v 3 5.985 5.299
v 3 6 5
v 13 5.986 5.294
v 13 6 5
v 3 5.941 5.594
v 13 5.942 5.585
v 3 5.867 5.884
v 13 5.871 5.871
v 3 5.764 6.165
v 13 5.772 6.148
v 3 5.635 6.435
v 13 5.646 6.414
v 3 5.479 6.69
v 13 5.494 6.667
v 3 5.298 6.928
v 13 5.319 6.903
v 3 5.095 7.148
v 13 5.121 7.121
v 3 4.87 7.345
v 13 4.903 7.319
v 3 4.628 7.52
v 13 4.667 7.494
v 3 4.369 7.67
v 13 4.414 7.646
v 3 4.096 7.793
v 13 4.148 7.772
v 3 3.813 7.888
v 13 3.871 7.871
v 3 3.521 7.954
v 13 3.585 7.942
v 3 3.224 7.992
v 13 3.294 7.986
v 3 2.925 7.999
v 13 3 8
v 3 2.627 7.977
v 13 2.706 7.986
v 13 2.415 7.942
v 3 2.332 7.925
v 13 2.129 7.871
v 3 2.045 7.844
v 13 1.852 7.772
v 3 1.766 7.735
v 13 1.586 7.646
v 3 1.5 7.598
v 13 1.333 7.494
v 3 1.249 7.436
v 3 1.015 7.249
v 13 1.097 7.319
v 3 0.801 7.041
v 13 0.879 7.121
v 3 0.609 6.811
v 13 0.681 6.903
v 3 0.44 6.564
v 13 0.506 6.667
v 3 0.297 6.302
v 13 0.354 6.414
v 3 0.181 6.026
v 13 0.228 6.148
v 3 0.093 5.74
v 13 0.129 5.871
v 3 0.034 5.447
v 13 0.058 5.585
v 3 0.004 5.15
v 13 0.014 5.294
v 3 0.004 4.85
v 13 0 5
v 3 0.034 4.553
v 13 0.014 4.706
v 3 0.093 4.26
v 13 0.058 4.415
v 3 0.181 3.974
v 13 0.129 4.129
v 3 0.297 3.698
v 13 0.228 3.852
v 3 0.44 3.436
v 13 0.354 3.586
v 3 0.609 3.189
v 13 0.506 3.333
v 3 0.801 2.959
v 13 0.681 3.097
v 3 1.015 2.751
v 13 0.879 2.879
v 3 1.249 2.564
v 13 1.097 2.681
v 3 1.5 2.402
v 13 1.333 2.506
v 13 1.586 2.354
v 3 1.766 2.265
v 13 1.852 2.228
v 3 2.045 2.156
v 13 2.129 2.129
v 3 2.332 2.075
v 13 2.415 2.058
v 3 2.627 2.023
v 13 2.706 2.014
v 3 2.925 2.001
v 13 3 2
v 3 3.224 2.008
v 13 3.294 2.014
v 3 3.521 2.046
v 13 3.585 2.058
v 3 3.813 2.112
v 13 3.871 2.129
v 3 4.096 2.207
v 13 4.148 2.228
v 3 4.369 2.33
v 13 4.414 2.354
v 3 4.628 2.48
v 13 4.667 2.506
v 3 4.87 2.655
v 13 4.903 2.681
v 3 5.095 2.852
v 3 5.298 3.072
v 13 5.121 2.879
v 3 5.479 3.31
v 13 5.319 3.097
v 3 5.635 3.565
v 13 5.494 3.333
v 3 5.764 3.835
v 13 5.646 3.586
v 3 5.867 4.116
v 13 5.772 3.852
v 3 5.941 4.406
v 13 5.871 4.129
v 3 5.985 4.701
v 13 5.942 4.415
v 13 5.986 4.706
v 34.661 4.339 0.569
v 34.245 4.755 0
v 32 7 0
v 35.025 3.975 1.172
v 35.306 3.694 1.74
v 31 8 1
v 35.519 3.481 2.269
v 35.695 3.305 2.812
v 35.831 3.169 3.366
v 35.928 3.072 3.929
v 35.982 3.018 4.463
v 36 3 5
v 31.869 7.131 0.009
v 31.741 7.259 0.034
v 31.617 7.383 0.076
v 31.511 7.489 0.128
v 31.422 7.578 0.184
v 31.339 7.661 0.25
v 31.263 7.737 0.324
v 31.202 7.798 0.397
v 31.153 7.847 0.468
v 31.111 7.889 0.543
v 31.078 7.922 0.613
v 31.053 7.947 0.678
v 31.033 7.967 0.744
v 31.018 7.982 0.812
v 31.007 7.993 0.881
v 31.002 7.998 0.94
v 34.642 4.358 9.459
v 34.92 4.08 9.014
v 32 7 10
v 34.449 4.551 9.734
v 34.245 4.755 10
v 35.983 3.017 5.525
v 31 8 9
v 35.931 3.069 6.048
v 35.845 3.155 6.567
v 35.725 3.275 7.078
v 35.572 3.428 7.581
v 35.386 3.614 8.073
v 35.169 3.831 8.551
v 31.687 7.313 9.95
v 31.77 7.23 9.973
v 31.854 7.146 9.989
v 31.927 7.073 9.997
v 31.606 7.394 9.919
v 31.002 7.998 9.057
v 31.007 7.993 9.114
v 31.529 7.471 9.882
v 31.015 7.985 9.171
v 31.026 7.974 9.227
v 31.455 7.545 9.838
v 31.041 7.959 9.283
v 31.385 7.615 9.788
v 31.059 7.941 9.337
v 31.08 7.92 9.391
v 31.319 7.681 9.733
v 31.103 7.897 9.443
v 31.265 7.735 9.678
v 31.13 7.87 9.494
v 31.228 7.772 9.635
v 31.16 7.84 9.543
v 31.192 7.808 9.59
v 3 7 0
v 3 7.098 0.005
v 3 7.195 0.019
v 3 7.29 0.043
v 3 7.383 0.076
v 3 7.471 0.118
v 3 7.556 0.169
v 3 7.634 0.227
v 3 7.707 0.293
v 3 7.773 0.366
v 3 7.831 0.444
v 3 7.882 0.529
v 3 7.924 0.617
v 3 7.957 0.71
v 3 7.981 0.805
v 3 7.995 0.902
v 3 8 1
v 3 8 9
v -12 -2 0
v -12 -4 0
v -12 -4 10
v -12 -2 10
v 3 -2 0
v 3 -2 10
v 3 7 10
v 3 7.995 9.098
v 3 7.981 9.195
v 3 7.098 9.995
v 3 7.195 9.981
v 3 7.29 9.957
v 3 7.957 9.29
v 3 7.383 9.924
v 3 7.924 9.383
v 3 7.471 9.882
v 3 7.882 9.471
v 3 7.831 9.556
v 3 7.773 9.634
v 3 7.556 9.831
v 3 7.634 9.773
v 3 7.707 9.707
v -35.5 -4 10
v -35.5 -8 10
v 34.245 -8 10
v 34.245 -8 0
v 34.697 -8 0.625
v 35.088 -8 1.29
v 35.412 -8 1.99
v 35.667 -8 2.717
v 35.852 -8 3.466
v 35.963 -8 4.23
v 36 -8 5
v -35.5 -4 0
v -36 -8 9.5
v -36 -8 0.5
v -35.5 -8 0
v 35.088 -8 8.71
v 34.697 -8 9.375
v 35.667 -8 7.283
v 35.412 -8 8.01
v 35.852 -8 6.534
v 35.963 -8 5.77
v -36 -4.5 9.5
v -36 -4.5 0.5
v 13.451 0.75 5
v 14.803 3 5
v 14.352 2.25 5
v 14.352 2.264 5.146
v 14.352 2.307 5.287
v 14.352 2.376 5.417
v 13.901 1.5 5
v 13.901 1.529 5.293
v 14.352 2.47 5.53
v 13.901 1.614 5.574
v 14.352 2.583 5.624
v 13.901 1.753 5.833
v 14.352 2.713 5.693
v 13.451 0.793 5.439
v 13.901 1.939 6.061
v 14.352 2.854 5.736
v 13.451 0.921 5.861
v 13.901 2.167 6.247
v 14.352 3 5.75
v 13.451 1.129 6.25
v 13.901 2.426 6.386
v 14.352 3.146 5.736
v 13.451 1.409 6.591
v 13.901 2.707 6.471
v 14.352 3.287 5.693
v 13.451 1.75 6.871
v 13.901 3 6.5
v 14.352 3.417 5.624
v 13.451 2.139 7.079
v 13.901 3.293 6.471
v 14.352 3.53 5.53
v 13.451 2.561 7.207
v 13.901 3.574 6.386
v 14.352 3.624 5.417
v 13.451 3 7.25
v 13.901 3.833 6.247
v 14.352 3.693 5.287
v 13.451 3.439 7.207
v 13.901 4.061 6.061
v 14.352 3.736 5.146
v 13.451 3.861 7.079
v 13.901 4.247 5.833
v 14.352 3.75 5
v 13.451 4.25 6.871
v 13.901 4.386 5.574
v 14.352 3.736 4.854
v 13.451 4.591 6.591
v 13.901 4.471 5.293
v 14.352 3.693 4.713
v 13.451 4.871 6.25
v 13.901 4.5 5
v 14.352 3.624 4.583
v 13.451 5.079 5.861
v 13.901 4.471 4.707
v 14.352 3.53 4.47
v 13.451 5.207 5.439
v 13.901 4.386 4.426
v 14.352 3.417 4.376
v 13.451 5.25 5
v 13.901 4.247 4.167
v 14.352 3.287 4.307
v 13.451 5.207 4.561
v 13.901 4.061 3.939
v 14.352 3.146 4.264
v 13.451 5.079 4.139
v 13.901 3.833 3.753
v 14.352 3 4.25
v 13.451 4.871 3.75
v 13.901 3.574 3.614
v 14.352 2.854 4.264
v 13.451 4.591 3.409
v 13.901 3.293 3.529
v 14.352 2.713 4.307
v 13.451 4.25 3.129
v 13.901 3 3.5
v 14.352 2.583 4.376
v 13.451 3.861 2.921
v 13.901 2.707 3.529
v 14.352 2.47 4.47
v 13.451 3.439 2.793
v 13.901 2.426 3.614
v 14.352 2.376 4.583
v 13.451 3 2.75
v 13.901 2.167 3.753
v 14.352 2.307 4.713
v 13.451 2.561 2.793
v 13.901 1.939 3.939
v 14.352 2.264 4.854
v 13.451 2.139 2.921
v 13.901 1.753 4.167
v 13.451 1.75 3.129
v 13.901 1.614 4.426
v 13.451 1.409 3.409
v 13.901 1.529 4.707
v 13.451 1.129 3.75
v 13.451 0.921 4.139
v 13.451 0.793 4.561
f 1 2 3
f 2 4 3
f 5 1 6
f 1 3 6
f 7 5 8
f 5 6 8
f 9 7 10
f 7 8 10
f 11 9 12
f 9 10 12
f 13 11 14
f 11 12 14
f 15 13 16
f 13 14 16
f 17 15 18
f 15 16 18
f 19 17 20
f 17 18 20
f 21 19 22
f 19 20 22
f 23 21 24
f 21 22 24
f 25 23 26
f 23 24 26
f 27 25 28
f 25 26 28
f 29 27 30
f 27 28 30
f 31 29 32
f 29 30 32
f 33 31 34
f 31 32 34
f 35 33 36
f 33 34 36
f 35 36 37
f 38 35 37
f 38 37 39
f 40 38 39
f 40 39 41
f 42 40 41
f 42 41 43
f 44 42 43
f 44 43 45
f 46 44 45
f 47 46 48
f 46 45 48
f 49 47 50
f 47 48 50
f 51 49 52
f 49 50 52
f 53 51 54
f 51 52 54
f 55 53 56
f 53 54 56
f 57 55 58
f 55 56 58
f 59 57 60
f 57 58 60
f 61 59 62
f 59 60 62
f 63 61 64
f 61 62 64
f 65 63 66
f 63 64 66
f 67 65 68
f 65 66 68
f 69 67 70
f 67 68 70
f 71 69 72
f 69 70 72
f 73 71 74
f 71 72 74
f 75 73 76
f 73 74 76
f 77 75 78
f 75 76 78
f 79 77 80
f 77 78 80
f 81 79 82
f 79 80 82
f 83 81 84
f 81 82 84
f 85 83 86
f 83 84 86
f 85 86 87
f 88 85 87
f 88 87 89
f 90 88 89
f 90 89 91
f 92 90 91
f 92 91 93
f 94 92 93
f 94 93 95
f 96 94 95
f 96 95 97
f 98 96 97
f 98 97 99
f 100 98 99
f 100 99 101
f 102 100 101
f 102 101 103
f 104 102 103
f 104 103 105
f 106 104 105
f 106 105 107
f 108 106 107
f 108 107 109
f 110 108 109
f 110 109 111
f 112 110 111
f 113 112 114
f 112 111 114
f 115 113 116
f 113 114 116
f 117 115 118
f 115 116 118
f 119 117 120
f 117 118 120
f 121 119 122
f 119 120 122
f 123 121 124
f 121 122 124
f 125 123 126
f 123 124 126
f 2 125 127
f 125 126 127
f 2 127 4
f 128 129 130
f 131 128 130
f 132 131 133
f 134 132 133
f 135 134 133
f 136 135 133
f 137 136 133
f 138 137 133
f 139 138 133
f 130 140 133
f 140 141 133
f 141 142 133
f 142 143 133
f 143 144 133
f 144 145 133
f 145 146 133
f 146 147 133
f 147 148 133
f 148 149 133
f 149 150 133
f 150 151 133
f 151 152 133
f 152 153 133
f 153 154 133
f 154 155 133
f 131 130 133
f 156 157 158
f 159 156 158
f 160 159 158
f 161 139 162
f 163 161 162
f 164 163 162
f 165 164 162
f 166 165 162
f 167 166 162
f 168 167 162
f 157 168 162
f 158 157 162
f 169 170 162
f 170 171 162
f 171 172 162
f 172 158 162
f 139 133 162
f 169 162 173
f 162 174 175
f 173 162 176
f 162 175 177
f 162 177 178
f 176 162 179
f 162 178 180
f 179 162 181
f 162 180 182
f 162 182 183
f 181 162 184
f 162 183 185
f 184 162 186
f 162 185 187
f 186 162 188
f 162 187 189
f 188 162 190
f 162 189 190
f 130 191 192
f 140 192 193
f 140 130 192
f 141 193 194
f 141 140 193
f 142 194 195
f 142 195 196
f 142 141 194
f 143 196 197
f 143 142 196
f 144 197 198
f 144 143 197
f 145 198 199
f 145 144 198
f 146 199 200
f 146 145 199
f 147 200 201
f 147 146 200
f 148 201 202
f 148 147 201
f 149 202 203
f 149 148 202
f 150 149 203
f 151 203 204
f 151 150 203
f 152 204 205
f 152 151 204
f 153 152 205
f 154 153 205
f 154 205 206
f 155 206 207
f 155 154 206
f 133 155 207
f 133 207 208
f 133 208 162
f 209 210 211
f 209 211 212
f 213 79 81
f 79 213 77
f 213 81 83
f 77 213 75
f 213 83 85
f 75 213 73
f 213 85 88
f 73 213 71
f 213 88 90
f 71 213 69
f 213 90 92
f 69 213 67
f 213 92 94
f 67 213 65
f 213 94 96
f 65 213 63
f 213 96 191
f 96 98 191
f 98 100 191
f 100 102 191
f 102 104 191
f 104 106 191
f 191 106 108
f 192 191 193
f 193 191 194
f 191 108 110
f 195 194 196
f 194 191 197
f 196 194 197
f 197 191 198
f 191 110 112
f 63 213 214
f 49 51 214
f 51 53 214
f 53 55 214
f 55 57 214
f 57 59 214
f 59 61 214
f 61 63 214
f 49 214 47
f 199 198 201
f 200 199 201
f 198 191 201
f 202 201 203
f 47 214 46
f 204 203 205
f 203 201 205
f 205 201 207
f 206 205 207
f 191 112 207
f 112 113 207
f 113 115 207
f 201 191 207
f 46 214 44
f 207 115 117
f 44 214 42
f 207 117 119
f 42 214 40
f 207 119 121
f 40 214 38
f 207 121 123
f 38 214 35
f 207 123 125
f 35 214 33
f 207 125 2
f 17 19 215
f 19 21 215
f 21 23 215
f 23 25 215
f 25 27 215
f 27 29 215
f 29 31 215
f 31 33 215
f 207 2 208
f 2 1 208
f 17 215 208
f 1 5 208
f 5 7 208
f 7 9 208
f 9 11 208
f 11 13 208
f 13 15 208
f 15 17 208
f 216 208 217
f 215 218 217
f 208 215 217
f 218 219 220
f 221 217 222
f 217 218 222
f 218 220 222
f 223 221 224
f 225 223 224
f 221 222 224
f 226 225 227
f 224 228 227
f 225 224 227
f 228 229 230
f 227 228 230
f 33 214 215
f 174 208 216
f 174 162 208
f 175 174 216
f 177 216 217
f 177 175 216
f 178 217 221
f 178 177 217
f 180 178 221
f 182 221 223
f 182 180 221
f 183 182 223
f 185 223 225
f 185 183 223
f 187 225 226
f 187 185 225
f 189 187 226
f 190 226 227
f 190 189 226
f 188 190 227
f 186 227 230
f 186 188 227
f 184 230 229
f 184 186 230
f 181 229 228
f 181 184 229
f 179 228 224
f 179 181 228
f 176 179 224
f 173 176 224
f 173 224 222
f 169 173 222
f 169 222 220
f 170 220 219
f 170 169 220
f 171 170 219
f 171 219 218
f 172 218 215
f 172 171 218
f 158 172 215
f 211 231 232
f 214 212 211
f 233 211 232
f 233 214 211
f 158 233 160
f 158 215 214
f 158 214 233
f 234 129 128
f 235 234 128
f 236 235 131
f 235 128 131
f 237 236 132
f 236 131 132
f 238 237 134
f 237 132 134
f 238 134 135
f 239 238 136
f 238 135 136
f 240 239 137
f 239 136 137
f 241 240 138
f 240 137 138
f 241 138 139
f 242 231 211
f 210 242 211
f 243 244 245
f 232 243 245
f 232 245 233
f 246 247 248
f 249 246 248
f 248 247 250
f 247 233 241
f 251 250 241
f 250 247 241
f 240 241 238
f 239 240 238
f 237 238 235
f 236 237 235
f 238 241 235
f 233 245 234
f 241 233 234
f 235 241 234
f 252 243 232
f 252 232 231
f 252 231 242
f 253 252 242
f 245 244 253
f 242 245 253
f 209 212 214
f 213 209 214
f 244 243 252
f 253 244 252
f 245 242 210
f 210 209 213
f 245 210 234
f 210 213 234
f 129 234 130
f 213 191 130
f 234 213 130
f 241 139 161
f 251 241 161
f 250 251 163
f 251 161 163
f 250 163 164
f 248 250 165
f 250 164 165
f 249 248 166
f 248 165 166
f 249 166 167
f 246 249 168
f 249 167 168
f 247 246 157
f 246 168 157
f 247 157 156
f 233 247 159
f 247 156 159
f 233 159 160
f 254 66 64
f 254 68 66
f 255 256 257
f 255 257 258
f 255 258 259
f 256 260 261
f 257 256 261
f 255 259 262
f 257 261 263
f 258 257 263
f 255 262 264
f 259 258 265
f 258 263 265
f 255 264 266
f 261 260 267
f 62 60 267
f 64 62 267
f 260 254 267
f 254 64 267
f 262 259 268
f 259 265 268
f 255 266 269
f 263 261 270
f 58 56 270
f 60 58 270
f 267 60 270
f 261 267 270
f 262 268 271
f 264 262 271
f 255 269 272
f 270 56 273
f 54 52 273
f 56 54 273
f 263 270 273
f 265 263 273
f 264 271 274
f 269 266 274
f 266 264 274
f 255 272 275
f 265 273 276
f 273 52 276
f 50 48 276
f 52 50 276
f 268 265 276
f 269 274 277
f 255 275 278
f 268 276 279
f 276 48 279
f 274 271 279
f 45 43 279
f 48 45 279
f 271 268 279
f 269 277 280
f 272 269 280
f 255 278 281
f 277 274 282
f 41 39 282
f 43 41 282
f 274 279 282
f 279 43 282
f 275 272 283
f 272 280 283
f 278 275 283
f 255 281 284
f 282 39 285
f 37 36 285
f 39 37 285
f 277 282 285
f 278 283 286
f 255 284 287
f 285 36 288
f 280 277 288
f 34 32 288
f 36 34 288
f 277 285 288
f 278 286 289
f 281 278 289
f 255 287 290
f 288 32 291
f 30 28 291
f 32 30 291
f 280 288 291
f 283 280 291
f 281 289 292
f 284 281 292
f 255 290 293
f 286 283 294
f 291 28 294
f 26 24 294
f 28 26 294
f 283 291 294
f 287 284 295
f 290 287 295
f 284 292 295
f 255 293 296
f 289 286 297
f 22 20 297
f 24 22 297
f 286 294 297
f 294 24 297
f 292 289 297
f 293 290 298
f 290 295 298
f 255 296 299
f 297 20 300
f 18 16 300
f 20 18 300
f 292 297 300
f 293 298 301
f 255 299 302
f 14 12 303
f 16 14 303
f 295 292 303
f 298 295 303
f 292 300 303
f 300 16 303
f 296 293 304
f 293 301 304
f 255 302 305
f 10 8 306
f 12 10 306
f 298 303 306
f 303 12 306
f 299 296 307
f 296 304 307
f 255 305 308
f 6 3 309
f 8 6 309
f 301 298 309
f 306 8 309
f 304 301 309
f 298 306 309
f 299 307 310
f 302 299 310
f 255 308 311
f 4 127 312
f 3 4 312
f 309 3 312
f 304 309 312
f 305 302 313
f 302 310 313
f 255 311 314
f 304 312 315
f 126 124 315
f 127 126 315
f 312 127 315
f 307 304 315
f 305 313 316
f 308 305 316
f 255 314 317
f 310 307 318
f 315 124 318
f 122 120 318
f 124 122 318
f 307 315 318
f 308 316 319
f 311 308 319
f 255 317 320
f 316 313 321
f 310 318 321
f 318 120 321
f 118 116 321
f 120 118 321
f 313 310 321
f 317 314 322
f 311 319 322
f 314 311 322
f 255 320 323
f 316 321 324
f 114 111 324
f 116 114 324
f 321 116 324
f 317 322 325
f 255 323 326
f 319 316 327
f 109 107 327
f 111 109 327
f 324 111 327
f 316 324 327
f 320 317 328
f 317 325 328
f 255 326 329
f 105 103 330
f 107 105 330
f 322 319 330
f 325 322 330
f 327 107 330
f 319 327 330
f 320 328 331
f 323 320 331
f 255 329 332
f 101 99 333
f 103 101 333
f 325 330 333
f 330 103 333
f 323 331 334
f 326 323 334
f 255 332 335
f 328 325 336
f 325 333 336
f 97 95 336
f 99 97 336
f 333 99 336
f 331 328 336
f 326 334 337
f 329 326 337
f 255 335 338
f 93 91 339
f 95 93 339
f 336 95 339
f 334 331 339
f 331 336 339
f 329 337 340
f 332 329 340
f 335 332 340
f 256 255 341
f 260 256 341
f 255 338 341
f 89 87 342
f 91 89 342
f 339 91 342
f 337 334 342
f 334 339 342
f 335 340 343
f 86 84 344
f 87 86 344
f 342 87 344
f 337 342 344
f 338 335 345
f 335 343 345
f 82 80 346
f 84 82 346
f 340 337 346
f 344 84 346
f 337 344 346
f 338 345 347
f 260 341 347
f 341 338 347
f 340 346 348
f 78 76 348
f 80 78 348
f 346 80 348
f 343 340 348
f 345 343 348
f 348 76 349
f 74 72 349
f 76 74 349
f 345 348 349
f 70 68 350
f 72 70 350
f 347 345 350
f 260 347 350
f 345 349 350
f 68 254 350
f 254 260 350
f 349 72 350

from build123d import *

# Parameters (mm, degrees)
F0_W      = 72
F0_H      = 16
F1_DEPTH  = 10
F2_SIZE   = 5
F4_DEPTH  = 10
F5_SIZE   = 0.5
F6_R      = 1
F8_DEPTH  = 25
F10_D     = 6
F10_DEPTH = 10
F10_TIP   = 1.8025818571


with BuildPart() as f1:
    # F0 (on Top) → F1 (new body)
    with BuildSketch(Plane.XY):
        Rectangle(F0_W, F0_H)
    extrude(amount=F1_DEPTH)

    # F2
    f2_edges = [f1.edges().sort_by_distance(p)[0] for p in [
        (36, 8, 5),
    ]]
    chamfer(f2_edges, length=F2_SIZE)

    # F3 (on face) → F4 (cut, through all)
    with BuildSketch(Plane.XY.offset(10)):
        Polygon((3, -2), (3, 8), (-36, 8), (-36, -4), (-12, -4), (-12, -2), align=None)
    extrude(amount=-F4_DEPTH, mode=Mode.SUBTRACT)

    # F5
    f5_edges = [f1.edges().sort_by_distance(p)[0] for p in [
        (-36, -4, 5),
        (-36, -6, 10),
        (-36, -6, 0),
    ]]
    chamfer(f5_edges, length=F5_SIZE)

    # F6
    f6_edges = [f1.edges().sort_by_distance(p)[0] for p in [
        (17, 8, 10),
        (17, 8, 0),
    ]]
    fillet(f6_edges, radius=F6_R)

    # F7 (on face) → F8 (cut)
    with BuildSketch(Plane(origin=(0, 8, 0), x_dir=(-1, 0, 0), z_dir=(0, 1, 0))):
        with BuildLine():
            ThreePointArc((-34.2449979984, 0), (-35.5485092564, 2.3504702292), (-36, 5))
            Line((-36, 5), (-36, 0))
            Line((-36, 0), (-34.2449979984, 0))
        make_face()
        with BuildLine():
            ThreePointArc((-36, 5), (-35.5485092564, 7.6495297708), (-34.2449979984, 10))
            Line((-34.2449979984, 10), (-36, 10))
            Line((-36, 10), (-36, 5))
        make_face()
    extrude(amount=-F8_DEPTH, mode=Mode.SUBTRACT)

    # F10
    with Locations(Plane(origin=(3, 0, 0), x_dir=(0, -1, 0), z_dir=(-1, 0, 0))):
        with Locations((-3, 5)):
            Hole(F10_D / 2, depth=F10_DEPTH)
            with Locations((0, 0, -(F10_DEPTH + F10_TIP / 2))):  # 118° drill point
                Cone(0, F10_D / 2, F10_TIP, mode=Mode.SUBTRACT)


solid = f1.part
